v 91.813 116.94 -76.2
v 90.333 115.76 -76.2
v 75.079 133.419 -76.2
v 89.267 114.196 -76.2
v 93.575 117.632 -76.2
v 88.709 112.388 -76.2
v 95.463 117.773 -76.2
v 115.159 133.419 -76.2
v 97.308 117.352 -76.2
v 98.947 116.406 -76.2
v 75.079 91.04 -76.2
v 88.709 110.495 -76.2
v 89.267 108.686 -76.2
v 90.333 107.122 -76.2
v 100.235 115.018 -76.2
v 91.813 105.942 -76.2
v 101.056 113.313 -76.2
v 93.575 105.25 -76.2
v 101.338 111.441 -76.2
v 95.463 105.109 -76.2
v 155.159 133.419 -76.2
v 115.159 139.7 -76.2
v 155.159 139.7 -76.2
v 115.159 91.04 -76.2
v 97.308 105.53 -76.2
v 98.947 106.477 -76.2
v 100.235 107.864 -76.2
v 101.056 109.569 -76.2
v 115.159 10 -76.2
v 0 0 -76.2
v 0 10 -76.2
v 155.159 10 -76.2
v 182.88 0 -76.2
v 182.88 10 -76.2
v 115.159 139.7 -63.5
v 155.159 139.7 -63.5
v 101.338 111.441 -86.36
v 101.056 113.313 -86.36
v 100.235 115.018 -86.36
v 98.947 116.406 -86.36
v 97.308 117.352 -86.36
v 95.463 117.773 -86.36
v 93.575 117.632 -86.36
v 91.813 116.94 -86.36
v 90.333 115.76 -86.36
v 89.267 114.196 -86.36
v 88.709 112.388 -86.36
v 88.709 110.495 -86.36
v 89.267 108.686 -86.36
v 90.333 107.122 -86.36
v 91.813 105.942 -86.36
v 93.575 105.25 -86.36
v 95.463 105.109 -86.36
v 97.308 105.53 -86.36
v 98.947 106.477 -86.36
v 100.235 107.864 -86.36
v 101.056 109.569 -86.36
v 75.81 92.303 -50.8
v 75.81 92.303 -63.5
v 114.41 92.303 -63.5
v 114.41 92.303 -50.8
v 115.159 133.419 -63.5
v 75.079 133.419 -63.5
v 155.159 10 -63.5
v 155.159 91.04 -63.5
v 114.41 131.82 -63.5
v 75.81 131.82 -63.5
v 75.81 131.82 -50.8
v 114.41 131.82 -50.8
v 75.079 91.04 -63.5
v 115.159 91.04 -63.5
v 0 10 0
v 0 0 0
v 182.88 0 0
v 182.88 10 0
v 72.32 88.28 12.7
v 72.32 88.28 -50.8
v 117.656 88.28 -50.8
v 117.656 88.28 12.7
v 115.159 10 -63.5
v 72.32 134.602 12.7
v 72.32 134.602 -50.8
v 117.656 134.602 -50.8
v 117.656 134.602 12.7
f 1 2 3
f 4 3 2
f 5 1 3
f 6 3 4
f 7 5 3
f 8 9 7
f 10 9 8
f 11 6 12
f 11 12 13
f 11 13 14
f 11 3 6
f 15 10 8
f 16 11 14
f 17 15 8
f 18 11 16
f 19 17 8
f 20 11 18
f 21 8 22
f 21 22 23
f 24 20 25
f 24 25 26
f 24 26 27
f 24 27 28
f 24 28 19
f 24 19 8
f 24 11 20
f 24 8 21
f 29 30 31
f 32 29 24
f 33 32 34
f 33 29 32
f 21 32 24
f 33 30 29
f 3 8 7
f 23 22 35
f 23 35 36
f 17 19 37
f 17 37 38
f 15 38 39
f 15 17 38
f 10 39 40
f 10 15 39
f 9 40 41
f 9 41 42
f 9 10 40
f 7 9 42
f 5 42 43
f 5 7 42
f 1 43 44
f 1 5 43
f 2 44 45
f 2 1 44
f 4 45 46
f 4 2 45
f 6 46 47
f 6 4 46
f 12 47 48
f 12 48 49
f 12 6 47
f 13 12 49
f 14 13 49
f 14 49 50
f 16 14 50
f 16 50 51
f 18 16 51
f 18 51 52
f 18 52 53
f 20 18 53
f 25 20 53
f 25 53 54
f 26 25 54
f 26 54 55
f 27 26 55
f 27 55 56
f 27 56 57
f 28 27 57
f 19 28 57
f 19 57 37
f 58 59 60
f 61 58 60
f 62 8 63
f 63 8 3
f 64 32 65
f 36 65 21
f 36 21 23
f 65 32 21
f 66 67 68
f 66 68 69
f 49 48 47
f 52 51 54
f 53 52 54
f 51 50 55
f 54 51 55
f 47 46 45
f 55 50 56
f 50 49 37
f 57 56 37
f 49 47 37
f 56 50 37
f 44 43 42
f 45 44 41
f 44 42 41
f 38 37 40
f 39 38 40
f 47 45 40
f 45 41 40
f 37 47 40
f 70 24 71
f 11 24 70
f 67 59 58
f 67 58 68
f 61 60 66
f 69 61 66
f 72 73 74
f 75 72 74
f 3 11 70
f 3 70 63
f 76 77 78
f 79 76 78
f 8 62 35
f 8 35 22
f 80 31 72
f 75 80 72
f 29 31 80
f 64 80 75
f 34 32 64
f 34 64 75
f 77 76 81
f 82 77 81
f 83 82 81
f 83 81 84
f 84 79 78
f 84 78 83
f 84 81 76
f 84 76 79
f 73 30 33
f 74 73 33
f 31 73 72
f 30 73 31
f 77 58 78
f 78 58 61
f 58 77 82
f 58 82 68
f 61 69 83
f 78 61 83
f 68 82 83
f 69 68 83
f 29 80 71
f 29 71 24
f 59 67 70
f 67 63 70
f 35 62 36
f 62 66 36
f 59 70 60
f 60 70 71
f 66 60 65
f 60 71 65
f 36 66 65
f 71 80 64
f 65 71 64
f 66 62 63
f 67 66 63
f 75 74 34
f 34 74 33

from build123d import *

# Parameters (mm, degrees)
SKETCH1_W           = 182.88
SKETCH1_H           = 76.2
BOSS_EXTRUDE1_DEPTH = 10
SKETCH2_W           = 40
SKETCH2_H           = 12.7
BOSS_EXTRUDE2_DEPTH = 129.7
SKETCH3_W           = 80.079962719
SKETCH3_H           = 42.379632712
BOSS_EXTRUDE3_DEPTH = 12.7
SKETCH4_W           = 38.600527556
SKETCH4_H           = 39.516860555
BOSS_EXTRUDE4_DEPTH = 12.7
SKETCH6_W           = 45.336351273
SKETCH6_H           = 46.321924127
BOSS_EXTRUDE5_DEPTH = 63.5
SKETCH7_R           = 6.35
BOSS_EXTRUDE6_DEPTH = 99.06


with BuildPart() as part:
    # Sketch1 → Boss-Extrude1 (new body)
    with BuildSketch(Plane(origin=(0, 0, 0), x_dir=(1, 0, 0), z_dir=(0, 1, 0))):
        with Locations((91.44, 38.1)):
            Rectangle(SKETCH1_W, SKETCH1_H)
    extrude(amount=BOSS_EXTRUDE1_DEPTH)

    # Sketch2 → Boss-Extrude2 (add)
    with BuildSketch(Plane(origin=(0, 10, 0), x_dir=(1, 0, 0), z_dir=(0, 1, 0))):
        with Locations((135.159453347, 69.85)):
            Rectangle(SKETCH2_W, SKETCH2_H)
    extrude(amount=BOSS_EXTRUDE2_DEPTH)

    # Sketch3 → Boss-Extrude3 (add)
    with BuildSketch(Plane(origin=(0, 0, -76.2), x_dir=(-1, 0, 0), z_dir=(0, 0, -1))):
        with Locations((-115.119471988, 112.229632712)):
            Rectangle(SKETCH3_W, SKETCH3_H)
    extrude(amount=-BOSS_EXTRUDE3_DEPTH)

    # Sketch4 → Boss-Extrude4 (add)
    with BuildSketch(Plane.XY.offset(-63.5)):
        with Locations((95.110147759, 112.061245717)):
            Rectangle(SKETCH4_W, SKETCH4_H)
    extrude(amount=BOSS_EXTRUDE4_DEPTH)

    # Sketch6 → Boss-Extrude5 (add)
    with BuildSketch(Plane.XY.offset(-50.8)):
        with Locations((94.988062274, 111.441174429)):
            Rectangle(SKETCH6_W, SKETCH6_H)
    extrude(amount=BOSS_EXTRUDE5_DEPTH)

    # Sketch7 → Boss-Extrude6 (add)
    with BuildSketch(Plane.XY.offset(12.7)):
        with Locations((94.988062274, 111.441174429)):
            Circle(SKETCH7_R)
    extrude(amount=-BOSS_EXTRUDE6_DEPTH)


solid = part.part
